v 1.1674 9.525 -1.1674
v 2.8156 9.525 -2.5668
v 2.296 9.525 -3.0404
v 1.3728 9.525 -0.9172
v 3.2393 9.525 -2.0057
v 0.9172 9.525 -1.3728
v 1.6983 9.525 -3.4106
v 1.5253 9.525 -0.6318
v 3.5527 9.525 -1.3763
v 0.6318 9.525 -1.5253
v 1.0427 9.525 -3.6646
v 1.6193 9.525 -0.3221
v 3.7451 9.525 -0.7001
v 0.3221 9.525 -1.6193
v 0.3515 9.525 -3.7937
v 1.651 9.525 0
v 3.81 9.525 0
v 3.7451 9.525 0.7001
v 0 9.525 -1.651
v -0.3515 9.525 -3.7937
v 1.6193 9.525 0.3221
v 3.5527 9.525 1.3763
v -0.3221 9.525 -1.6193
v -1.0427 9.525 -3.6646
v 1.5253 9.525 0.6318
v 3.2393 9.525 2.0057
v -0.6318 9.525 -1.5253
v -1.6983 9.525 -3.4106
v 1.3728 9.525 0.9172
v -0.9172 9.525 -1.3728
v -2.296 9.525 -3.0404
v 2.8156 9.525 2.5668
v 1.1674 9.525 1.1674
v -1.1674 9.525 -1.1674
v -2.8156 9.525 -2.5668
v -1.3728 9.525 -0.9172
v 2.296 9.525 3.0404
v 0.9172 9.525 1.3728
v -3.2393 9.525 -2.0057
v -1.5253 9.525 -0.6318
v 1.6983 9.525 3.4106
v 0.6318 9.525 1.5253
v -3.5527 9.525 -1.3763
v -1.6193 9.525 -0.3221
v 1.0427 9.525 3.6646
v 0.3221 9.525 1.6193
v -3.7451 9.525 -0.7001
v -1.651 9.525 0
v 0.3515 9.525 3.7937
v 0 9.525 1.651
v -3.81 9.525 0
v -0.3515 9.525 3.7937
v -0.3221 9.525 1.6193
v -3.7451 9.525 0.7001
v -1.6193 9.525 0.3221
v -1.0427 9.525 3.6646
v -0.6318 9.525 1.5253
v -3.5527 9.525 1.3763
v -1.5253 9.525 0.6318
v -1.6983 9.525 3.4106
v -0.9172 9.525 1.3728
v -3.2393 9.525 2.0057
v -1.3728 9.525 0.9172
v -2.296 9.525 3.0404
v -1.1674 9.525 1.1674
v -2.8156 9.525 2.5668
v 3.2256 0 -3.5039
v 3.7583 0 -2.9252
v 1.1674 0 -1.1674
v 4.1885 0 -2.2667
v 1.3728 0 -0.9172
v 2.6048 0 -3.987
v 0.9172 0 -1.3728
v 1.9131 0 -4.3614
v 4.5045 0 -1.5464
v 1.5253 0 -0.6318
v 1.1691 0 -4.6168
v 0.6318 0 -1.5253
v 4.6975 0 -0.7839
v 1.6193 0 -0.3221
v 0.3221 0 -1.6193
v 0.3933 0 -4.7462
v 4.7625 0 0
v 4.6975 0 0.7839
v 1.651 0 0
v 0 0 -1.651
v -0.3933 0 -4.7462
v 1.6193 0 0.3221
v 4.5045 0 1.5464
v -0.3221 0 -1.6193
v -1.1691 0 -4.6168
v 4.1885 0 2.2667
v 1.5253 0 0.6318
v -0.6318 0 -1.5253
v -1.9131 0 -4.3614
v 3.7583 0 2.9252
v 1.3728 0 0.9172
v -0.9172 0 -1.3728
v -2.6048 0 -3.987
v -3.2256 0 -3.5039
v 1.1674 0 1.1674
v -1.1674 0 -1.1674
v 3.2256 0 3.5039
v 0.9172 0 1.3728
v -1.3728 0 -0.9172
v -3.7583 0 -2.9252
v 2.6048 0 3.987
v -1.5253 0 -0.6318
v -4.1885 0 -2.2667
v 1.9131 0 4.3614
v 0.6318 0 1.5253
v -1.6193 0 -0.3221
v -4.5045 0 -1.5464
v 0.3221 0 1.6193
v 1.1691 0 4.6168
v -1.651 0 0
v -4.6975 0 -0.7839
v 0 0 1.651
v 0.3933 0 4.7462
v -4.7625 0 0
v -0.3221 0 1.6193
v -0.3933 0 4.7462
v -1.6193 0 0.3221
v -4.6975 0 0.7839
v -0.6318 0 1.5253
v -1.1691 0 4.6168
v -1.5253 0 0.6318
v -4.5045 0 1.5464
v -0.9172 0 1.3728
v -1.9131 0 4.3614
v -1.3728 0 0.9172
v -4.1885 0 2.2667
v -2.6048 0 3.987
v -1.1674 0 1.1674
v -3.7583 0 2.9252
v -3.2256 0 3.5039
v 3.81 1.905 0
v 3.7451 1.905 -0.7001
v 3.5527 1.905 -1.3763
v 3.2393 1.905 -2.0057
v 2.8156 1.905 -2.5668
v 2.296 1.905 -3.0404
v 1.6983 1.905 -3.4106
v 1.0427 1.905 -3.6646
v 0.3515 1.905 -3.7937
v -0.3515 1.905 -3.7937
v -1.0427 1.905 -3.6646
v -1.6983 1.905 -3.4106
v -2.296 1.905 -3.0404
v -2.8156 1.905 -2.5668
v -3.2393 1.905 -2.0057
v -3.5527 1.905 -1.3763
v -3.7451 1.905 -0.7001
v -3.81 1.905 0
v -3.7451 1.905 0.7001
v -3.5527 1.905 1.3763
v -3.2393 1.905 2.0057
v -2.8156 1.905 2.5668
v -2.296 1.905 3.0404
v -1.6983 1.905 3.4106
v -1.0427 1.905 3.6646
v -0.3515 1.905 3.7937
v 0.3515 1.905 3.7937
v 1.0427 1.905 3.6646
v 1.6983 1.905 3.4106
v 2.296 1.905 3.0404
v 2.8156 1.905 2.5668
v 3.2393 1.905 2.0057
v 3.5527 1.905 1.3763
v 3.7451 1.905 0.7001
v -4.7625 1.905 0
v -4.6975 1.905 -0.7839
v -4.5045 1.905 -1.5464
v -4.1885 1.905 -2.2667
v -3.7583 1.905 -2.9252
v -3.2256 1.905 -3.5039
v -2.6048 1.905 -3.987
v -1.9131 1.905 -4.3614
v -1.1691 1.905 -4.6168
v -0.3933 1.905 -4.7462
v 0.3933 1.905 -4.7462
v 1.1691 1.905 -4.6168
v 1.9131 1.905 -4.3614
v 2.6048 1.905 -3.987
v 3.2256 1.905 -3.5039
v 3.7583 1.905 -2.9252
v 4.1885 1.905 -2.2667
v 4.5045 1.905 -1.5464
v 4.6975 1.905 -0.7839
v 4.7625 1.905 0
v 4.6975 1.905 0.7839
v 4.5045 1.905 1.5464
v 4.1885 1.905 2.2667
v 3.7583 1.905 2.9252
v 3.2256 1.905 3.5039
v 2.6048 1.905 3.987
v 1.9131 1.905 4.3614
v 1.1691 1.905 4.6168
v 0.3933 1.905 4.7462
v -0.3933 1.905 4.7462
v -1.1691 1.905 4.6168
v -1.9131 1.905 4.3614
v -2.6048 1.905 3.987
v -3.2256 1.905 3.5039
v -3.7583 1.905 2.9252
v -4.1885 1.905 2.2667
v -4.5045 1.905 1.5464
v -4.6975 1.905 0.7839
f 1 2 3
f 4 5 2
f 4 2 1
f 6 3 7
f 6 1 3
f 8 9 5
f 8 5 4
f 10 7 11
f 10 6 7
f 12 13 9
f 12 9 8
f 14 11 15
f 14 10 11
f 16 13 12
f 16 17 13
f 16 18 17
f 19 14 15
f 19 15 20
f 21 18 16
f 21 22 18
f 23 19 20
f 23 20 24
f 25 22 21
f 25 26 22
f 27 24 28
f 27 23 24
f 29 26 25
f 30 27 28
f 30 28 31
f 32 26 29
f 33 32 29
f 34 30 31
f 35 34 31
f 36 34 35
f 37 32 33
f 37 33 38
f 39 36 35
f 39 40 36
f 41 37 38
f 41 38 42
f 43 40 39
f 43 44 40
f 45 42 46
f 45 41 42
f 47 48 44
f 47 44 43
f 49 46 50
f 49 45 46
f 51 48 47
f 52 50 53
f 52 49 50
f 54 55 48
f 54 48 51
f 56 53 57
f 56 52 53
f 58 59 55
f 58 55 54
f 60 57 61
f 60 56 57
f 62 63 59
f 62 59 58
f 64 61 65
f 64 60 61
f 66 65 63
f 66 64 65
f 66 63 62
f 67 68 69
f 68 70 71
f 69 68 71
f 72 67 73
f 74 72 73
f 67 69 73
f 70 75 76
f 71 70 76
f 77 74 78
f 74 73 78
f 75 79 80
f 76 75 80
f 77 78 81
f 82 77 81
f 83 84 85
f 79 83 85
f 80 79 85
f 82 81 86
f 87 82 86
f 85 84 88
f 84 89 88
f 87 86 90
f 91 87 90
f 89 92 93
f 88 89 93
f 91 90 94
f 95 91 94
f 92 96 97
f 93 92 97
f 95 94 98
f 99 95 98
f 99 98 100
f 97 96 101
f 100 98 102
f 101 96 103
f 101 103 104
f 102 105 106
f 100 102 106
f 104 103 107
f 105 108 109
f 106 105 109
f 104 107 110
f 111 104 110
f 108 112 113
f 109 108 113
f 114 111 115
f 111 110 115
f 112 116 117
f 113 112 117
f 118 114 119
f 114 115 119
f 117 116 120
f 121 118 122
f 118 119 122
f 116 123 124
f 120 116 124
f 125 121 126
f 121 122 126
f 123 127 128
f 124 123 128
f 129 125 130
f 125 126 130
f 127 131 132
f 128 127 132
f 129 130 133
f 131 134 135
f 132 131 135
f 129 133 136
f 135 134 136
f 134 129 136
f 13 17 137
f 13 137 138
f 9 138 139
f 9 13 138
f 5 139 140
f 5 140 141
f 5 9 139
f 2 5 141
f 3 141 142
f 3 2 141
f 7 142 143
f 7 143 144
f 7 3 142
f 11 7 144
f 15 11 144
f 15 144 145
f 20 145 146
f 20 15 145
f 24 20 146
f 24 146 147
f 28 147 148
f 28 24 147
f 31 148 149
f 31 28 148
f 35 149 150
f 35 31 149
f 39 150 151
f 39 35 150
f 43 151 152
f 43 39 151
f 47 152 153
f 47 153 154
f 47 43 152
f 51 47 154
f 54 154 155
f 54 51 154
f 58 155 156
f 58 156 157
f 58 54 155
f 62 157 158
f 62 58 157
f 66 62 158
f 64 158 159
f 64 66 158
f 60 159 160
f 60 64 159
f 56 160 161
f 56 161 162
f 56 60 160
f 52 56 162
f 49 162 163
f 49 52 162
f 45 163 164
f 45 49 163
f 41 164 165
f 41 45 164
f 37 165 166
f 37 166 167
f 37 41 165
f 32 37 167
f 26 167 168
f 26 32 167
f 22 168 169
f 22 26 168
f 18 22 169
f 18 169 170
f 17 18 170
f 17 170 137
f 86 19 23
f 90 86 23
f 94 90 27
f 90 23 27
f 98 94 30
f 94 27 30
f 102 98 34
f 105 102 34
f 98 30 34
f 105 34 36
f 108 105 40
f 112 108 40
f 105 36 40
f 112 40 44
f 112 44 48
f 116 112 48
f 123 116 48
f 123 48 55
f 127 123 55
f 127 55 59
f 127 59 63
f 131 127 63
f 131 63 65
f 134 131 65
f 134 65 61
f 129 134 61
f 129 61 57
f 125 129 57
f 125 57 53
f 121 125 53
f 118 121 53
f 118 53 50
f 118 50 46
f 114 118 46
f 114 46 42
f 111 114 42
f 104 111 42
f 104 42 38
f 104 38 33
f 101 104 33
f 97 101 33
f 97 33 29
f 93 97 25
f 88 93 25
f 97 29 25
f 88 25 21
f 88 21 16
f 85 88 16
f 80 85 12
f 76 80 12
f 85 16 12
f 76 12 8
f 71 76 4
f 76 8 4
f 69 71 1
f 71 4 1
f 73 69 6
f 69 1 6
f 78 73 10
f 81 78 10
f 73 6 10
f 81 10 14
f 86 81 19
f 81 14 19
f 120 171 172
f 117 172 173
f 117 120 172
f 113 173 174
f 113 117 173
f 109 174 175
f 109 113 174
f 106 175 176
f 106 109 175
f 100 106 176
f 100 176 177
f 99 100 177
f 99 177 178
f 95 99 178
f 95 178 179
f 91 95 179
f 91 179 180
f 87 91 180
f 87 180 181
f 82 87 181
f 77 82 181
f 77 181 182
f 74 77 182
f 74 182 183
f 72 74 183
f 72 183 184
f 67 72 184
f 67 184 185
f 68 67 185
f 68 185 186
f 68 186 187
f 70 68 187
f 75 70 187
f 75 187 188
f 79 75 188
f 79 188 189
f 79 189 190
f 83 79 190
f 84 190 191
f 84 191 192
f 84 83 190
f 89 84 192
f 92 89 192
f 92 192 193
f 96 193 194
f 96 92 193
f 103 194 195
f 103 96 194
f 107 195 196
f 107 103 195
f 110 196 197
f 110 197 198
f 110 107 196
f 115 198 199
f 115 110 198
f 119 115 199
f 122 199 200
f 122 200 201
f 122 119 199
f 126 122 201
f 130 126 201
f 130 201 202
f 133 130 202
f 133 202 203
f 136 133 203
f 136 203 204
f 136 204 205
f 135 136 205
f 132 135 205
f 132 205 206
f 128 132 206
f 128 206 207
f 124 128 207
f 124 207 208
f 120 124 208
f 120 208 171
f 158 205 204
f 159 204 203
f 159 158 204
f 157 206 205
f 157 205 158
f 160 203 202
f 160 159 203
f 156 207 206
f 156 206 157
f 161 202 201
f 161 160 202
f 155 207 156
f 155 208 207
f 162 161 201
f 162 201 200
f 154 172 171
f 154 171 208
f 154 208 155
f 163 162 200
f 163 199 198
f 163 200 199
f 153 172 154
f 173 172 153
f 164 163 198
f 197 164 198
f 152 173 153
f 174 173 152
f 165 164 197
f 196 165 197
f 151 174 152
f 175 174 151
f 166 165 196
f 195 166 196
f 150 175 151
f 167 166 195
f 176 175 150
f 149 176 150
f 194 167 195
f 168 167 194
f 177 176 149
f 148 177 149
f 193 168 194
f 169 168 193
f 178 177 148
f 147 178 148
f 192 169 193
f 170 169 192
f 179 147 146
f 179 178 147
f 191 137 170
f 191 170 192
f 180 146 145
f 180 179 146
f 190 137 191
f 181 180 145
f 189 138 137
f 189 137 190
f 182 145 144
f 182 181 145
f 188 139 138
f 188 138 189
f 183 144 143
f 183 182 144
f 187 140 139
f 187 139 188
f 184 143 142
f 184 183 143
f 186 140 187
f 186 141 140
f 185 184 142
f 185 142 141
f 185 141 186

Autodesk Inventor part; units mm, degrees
ref_plane "YZ Plane" through (0, 0, 0) normal (1, 0, 0) x (0, 1, 0)
ref_plane "XZ Plane" through (0, 0, 0) normal (0, 1, 0) x (-1, 0, 0)
ref_plane "XY Plane" through (0, 0, 0) normal (0, 0, 1) x (1, 0, 0)
sketch "Sketch1" plane through (0, 0, 0) normal (0, 1, 0) x (-1, 0, 0)
  circle A0 centre (0, 0) radius 4.7625
  dimension "d0" = 9.525
extrude "Extrusion1" add sketch "Sketch1" along normal blind 9.525
sketch "Sketch2" plane through (0, 9.525, 0) normal (0, 1, 0) x (1, 0, 0)
  circle A0 centre (0, 0) radius 6.35
  circle A1 centre (0, 0) radius 3.81
  dimension "d3" = 12.7
  dimension "d4" = 7.62
extrude "Extrusion2" cut sketch "Sketch2" against normal blind 7.62
sketch "Sketch3" plane through (0, 0, 0) normal (0, -1, 0) x (1, 0, 0)
  circle A0 centre (0, 0) radius 1.5777
hole "Hole1" at (0, 0, 0) direction (0, 1, 0) diameter 3.302 end through all thread size "8-32 UNC" class "2B" standard "ANSI Unified Screw Threads"
properties part number "feet type 2 part 1" material "Brass, Soft Yellow"
